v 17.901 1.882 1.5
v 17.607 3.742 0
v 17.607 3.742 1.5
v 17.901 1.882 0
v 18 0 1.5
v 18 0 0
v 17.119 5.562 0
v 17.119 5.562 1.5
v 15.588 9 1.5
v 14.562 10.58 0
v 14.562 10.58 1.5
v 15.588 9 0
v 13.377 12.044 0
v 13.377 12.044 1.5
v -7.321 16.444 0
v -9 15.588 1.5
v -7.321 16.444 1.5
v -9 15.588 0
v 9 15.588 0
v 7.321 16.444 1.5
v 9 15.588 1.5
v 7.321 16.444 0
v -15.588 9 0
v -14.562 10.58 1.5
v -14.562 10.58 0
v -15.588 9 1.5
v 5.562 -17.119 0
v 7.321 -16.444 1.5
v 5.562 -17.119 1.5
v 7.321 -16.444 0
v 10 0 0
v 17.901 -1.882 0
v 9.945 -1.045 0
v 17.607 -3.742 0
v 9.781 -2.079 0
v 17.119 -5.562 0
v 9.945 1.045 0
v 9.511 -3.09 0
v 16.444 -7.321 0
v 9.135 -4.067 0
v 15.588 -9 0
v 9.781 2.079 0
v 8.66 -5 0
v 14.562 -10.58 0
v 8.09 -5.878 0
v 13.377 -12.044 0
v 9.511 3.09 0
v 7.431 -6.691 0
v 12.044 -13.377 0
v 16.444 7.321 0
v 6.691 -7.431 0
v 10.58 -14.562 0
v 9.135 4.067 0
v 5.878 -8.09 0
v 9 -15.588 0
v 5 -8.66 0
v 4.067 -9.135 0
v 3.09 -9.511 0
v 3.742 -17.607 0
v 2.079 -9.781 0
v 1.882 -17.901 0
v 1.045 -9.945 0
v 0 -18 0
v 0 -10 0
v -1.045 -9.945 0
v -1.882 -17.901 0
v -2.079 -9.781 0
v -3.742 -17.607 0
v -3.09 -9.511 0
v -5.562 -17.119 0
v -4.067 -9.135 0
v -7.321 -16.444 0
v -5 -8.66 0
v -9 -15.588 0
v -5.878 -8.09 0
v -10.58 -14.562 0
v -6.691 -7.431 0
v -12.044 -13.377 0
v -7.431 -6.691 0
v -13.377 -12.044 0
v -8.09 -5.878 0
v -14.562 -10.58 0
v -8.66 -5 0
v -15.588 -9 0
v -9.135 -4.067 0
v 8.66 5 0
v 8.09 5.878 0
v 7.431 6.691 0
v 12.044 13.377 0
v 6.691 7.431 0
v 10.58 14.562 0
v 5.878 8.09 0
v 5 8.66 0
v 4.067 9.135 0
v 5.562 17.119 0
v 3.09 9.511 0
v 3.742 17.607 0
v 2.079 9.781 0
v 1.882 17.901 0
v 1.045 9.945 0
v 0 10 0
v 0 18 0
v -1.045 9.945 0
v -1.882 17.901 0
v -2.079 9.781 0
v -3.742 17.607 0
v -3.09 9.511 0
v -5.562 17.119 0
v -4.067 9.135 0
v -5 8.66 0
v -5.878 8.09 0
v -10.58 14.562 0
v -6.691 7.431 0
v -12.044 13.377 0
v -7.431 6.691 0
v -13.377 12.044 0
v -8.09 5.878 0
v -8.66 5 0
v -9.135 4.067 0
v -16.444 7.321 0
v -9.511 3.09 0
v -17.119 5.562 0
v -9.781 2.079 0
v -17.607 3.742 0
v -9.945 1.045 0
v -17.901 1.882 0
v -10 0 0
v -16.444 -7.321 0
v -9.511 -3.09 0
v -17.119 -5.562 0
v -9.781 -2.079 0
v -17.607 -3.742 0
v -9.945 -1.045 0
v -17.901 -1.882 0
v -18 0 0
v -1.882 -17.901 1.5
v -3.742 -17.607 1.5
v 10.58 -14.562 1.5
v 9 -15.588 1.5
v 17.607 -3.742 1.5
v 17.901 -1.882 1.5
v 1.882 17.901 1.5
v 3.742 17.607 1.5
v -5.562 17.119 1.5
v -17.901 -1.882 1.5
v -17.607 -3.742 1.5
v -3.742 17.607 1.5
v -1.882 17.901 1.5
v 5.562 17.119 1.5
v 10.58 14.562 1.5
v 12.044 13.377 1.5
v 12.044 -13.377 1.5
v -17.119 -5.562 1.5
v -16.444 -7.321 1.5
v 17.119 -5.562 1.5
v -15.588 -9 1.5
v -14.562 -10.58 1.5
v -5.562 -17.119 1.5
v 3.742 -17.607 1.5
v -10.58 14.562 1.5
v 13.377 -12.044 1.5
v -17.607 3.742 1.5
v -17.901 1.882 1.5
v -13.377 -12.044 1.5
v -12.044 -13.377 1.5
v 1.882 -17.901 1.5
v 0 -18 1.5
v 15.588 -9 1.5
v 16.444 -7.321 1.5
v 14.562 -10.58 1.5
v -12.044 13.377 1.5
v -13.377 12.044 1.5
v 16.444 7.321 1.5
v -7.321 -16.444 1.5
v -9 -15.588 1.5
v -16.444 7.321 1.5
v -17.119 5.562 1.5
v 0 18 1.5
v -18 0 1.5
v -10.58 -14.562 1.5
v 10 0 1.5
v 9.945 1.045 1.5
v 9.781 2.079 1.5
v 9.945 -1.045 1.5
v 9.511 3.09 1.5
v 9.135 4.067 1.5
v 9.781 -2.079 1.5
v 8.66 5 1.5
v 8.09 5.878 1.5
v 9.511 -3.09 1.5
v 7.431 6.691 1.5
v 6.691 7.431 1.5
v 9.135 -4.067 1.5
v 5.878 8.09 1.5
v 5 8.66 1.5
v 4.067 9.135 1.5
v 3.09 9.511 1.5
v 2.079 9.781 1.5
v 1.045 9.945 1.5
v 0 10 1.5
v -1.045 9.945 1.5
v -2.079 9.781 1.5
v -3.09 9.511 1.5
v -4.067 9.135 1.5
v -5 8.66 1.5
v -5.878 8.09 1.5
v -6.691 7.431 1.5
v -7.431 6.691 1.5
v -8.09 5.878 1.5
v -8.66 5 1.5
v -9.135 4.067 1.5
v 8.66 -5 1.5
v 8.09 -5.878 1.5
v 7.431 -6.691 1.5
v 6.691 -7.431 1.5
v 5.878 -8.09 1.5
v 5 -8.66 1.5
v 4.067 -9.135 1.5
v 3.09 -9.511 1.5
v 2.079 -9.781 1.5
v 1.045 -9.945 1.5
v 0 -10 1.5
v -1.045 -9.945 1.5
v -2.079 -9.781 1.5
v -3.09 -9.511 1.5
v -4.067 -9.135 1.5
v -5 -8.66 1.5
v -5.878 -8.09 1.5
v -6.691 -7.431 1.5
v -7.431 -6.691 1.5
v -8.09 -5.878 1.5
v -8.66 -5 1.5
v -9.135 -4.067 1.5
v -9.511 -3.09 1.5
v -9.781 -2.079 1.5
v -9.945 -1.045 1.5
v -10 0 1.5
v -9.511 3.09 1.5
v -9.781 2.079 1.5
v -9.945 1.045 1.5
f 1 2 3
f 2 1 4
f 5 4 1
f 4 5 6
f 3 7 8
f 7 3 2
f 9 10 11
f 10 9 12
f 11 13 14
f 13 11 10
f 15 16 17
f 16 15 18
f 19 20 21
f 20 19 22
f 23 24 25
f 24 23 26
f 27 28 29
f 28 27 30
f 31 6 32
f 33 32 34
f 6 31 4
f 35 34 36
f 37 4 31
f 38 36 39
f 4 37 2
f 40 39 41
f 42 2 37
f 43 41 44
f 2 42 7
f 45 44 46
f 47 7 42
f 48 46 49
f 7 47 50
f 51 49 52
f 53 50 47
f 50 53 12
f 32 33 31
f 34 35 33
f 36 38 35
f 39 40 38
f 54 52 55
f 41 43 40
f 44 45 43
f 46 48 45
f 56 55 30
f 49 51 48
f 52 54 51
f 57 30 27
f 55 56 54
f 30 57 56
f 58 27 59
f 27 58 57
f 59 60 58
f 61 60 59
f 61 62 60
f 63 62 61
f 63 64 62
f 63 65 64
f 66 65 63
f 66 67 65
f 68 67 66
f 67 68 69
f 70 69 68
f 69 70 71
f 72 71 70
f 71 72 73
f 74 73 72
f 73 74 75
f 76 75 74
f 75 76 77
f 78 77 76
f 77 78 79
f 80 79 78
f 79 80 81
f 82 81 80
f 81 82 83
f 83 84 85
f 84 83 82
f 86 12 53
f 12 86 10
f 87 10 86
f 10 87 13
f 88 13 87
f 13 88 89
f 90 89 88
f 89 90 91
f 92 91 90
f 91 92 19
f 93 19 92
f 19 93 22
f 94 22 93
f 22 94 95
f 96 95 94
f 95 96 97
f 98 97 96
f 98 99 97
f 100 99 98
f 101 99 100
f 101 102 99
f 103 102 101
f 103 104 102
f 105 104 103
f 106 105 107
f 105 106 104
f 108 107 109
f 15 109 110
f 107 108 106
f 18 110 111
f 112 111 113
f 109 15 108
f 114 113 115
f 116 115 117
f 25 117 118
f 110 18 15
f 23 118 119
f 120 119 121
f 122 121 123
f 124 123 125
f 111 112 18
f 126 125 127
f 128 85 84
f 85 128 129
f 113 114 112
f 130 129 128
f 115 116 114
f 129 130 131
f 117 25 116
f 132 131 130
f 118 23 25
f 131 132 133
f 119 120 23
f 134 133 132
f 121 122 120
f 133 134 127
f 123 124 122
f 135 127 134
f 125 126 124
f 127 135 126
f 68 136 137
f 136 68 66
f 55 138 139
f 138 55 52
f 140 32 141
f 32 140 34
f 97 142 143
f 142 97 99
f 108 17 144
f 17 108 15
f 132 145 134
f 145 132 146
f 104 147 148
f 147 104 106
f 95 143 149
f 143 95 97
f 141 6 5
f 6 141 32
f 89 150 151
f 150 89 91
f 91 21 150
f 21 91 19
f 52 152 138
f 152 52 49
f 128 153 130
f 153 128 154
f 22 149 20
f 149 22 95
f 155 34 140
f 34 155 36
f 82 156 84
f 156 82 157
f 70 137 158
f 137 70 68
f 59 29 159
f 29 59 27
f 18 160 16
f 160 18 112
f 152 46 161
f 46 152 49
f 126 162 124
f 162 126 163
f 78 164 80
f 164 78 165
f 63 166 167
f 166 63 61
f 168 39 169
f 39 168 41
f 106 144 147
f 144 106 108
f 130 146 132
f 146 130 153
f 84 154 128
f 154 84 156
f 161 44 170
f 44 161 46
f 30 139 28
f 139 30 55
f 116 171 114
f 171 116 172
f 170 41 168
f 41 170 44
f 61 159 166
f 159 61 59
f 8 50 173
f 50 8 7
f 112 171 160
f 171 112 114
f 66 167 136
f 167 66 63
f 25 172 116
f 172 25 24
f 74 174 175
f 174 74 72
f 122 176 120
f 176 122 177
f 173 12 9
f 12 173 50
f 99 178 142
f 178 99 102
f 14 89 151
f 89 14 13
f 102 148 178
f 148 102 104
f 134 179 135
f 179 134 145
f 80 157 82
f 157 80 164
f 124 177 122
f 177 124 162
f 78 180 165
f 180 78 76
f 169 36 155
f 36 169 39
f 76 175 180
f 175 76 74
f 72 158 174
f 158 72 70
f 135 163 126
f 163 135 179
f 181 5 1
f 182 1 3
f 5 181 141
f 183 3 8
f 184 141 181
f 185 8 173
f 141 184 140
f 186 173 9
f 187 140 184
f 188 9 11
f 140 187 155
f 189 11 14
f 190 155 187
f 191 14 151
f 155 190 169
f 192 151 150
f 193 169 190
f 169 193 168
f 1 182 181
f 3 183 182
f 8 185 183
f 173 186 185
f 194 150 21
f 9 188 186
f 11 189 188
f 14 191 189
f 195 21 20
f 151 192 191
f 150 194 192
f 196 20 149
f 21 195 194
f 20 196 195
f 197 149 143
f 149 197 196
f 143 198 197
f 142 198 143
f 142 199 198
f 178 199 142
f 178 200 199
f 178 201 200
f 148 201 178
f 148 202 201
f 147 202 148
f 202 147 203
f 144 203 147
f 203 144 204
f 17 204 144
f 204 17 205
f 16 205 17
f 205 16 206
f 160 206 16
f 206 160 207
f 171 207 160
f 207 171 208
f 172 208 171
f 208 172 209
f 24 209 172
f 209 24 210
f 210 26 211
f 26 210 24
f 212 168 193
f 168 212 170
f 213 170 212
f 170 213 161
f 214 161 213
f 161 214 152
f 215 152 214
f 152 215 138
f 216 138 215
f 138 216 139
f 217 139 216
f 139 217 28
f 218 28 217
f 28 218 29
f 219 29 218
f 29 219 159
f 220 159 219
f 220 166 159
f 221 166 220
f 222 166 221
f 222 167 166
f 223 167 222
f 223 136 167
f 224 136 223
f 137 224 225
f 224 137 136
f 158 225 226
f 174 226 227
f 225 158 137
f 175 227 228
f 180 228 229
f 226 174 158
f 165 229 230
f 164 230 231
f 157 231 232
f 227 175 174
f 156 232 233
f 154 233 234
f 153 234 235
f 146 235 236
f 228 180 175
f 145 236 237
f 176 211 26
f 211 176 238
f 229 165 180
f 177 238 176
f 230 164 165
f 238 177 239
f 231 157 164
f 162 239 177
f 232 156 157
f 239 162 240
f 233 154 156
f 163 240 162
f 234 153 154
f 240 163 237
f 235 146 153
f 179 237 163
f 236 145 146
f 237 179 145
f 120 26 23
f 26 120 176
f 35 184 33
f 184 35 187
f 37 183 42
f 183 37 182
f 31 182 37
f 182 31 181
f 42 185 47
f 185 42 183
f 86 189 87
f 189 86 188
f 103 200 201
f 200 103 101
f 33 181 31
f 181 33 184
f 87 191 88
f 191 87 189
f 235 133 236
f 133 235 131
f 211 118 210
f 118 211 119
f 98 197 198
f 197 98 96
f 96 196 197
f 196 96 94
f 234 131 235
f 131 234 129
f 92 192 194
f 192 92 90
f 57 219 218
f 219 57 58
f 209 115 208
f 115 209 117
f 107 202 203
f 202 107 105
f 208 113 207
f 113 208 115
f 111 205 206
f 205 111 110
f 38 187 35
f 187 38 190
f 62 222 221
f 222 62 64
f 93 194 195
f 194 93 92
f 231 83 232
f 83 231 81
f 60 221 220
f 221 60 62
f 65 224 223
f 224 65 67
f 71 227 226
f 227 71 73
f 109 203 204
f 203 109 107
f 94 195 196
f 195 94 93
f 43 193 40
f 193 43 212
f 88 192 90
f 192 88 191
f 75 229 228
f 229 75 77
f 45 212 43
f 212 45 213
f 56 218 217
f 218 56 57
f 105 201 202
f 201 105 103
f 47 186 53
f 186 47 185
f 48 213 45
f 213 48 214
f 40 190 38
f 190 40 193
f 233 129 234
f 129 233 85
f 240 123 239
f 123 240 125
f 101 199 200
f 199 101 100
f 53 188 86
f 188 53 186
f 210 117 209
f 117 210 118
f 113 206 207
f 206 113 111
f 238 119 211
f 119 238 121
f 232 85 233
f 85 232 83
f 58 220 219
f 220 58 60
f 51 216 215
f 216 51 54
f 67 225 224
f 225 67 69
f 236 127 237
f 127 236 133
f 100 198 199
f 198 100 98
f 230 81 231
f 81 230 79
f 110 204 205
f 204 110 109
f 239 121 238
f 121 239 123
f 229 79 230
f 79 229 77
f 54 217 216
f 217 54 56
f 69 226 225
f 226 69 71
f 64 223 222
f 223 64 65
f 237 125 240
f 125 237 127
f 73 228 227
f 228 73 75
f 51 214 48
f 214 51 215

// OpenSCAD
// Precision shim ring.
$fn = 60;
eps = 0.02;
inner_d = 20;
outer_d = 36;
thickness = 1.5;
difference() {
    cylinder(d = outer_d, h = thickness);
    translate([0, 0, -eps]) cylinder(d = inner_d, h = thickness + 2 * eps);
}
